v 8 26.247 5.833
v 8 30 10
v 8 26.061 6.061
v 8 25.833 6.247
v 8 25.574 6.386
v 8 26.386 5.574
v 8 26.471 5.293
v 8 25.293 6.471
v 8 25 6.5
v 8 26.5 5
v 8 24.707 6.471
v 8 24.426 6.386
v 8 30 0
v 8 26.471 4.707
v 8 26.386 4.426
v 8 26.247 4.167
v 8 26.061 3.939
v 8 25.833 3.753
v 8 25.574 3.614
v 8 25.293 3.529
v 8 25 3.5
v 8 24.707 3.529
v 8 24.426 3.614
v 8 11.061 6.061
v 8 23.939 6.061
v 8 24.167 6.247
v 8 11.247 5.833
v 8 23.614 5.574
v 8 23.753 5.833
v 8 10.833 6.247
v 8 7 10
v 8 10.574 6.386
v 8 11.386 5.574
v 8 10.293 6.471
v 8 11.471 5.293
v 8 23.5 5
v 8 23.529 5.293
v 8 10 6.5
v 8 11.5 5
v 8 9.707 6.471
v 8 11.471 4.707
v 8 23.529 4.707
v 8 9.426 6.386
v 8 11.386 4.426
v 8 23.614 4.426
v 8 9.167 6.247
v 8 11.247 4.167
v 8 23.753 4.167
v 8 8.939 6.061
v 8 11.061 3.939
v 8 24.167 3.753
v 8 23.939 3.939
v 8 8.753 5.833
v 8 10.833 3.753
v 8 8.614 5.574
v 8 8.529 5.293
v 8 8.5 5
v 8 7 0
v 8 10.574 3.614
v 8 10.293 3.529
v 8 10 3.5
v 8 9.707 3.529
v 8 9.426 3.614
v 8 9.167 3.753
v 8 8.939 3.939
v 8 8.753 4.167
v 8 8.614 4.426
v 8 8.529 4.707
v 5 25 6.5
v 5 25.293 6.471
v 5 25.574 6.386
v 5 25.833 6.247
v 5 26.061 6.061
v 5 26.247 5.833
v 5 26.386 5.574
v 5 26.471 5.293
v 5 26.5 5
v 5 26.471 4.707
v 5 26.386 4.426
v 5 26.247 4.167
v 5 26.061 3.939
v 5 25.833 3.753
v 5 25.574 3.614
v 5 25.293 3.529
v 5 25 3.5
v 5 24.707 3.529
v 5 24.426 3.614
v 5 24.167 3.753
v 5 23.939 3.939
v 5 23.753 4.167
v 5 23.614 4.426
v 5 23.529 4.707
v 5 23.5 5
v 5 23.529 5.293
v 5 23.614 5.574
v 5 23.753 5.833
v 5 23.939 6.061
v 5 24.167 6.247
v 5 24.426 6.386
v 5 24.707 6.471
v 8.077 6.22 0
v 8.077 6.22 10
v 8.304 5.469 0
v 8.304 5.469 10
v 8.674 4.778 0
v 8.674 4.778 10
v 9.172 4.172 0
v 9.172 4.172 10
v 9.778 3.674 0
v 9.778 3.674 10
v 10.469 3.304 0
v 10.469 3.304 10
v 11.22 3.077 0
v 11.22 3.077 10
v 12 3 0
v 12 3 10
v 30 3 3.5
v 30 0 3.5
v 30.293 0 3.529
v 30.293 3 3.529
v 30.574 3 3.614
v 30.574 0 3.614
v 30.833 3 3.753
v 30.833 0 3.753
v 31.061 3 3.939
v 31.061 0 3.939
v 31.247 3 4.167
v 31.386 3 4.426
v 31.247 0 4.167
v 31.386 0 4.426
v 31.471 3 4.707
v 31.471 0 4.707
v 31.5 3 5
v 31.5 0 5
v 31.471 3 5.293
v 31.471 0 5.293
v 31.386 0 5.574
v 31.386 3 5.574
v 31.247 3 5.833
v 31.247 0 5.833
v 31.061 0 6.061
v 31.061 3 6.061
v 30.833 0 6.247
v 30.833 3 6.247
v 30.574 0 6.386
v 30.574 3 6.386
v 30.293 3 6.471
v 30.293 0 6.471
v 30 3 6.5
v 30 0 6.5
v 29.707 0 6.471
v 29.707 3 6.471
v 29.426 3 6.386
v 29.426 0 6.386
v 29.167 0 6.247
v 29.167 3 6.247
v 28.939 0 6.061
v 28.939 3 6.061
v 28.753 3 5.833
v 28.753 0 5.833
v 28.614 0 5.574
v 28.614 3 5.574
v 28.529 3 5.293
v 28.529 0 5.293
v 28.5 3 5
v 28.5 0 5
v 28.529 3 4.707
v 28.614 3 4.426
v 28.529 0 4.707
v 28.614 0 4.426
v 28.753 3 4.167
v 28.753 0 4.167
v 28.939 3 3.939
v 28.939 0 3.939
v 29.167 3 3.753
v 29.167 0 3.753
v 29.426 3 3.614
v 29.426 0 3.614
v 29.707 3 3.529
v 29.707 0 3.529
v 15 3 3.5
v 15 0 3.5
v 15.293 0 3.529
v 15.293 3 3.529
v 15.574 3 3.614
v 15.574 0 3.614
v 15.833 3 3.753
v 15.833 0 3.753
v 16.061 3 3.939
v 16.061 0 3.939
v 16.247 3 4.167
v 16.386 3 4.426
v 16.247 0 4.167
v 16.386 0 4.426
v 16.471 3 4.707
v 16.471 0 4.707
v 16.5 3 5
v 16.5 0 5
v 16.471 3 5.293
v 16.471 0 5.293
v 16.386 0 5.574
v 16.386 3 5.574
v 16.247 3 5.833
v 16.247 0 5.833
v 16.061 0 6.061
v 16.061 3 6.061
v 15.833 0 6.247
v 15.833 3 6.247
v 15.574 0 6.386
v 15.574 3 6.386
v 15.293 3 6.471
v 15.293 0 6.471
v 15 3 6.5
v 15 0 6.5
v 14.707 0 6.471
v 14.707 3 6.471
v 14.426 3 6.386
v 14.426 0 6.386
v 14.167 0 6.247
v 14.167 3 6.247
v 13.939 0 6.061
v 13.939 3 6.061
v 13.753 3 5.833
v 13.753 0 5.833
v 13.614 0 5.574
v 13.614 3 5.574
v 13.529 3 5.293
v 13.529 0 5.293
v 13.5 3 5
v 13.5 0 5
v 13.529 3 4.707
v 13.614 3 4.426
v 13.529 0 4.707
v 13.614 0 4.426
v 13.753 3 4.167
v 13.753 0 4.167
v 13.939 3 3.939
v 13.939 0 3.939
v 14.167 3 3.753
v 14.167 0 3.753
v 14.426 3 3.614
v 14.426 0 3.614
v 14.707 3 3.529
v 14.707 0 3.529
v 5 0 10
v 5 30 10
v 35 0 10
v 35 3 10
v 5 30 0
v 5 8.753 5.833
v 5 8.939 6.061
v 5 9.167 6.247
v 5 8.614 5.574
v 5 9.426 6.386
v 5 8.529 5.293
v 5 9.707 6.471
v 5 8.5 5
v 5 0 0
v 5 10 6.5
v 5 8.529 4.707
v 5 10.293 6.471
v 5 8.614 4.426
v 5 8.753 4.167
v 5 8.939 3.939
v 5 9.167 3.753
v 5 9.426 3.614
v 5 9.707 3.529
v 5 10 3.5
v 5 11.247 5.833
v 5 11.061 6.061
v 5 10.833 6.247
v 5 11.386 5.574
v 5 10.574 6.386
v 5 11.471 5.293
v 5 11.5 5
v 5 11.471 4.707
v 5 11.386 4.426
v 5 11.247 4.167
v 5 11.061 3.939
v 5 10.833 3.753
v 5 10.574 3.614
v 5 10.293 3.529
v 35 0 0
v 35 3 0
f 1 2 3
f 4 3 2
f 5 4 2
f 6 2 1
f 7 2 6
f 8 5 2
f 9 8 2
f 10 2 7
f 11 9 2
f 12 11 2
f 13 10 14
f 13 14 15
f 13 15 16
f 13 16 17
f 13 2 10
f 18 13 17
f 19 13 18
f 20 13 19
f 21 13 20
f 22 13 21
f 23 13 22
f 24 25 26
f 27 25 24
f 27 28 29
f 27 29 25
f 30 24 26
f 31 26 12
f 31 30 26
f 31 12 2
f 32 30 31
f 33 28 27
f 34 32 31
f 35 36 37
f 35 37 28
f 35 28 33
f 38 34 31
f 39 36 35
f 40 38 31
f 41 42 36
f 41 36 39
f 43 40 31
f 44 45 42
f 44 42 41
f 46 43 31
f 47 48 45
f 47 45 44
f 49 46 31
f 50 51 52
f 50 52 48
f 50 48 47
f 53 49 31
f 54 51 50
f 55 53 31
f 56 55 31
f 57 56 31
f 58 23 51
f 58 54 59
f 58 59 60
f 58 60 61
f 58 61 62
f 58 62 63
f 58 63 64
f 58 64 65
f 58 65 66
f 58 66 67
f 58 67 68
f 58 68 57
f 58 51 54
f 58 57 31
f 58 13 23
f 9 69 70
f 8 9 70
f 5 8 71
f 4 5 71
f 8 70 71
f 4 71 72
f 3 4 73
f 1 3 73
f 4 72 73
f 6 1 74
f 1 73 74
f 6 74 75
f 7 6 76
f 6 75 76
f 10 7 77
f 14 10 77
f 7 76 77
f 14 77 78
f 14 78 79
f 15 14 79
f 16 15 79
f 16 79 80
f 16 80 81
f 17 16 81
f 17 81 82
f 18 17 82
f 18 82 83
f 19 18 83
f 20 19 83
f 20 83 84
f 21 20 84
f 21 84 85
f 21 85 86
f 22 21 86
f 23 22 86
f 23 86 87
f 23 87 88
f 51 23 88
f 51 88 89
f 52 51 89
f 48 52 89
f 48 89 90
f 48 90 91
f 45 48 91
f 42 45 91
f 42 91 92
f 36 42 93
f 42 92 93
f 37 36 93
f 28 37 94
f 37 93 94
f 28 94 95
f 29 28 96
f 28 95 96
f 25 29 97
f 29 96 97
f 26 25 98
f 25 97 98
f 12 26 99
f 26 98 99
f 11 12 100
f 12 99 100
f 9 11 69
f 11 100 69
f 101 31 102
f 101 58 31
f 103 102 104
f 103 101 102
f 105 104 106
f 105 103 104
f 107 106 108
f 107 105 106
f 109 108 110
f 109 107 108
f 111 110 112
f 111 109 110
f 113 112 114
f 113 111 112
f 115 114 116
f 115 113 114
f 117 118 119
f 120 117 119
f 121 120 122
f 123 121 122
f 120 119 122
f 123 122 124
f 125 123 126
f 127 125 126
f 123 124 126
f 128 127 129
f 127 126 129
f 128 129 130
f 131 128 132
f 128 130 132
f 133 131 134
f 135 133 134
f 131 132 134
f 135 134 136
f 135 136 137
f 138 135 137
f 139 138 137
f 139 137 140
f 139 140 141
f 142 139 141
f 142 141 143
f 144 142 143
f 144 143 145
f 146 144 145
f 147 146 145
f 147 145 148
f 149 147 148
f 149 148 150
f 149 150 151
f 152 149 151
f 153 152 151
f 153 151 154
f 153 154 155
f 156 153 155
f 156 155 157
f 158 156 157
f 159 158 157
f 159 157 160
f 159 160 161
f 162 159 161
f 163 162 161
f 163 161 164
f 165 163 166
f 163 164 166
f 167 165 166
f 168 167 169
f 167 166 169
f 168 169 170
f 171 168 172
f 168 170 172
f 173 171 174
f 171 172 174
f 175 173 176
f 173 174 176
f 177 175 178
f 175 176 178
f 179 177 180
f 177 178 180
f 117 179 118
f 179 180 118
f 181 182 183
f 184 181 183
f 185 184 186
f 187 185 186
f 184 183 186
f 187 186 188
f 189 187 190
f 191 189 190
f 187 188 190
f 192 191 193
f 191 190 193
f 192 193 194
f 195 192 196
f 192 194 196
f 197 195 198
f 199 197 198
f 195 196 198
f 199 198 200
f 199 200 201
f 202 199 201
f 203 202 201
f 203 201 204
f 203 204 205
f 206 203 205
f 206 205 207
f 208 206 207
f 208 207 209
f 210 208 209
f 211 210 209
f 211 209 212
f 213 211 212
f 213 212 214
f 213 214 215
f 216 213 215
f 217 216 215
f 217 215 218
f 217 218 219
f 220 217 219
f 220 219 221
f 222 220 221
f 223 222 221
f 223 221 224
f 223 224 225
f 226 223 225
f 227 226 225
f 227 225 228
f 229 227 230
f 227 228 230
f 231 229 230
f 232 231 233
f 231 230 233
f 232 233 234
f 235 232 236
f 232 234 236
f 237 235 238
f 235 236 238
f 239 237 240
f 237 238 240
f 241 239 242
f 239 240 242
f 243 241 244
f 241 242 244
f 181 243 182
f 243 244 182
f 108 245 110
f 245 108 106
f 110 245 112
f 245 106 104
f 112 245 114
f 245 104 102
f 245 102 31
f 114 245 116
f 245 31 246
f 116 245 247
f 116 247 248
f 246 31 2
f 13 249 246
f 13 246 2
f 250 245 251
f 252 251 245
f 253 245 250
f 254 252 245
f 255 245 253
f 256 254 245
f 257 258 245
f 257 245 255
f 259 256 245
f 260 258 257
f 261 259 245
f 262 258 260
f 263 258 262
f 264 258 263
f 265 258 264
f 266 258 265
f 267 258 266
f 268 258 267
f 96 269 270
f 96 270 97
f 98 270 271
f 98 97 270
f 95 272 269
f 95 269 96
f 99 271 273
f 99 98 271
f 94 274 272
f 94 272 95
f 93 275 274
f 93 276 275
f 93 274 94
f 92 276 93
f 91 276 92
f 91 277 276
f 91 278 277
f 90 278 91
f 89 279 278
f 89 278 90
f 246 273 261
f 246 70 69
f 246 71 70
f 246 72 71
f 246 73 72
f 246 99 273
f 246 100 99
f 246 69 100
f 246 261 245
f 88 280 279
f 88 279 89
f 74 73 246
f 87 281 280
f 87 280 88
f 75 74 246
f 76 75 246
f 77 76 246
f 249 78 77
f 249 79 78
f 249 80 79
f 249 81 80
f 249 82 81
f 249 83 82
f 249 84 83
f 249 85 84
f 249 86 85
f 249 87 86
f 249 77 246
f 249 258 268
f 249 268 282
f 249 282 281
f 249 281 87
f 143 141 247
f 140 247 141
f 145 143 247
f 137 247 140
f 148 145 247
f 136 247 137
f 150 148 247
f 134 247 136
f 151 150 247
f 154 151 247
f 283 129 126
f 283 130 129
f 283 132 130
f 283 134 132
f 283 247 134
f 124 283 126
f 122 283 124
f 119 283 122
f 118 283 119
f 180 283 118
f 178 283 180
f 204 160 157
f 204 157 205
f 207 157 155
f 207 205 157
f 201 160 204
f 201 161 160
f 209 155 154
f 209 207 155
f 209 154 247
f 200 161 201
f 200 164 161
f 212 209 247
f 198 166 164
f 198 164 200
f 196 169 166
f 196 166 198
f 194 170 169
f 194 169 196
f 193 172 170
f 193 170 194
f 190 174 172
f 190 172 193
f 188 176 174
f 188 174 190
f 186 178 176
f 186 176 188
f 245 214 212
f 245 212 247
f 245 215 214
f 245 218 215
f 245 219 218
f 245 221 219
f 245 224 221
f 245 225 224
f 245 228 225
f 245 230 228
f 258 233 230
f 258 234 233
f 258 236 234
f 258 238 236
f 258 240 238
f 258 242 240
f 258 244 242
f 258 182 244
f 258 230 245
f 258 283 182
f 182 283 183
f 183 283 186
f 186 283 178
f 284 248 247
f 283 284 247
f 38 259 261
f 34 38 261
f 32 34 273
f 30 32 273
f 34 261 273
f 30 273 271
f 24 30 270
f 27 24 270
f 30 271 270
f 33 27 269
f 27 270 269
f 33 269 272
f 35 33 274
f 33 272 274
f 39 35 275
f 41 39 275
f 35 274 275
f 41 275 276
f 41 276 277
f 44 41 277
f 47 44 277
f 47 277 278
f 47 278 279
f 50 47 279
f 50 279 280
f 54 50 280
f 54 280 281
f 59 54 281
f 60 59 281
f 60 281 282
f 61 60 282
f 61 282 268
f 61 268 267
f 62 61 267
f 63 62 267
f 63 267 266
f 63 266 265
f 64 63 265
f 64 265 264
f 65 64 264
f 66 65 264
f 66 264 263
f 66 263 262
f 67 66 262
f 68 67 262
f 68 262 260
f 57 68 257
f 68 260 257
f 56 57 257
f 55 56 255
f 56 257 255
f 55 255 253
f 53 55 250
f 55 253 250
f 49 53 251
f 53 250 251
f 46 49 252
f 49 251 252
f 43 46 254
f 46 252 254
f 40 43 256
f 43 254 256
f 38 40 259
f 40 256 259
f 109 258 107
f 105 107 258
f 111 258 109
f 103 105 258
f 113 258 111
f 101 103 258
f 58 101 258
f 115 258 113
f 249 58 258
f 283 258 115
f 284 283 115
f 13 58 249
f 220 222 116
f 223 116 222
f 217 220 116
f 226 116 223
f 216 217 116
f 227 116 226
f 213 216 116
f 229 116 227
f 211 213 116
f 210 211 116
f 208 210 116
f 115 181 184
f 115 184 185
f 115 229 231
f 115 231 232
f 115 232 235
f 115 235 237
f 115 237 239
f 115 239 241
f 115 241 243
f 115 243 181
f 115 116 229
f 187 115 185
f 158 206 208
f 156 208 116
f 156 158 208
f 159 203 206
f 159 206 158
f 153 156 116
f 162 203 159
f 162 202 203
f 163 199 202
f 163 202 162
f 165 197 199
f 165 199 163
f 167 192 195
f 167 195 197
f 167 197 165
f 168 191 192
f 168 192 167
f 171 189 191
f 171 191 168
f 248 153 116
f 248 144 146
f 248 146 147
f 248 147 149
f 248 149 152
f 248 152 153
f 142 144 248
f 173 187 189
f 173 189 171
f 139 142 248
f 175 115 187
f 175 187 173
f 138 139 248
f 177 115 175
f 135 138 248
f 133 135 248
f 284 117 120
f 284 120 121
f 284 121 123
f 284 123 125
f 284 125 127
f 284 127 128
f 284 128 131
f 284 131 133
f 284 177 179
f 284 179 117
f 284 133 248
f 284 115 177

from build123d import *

# Parameters (mm, degrees)
F1_DEPTH   = 5
F4_D       = 3
F4_ON_F3_D = 3
F5_ANGLE   = 90


with BuildPart() as f1:
    # F0 (on Right) → F1 (new body, symmetric)
    with BuildSketch(Plane.YZ):
        with BuildLine():
            Line((3, 30), (0, 30))
            Line((0, 30), (0, 0))
            Line((0, 0), (30, 0))
            Line((30, 0), (30, 3))
            Line((30, 3), (7, 3))
            ThreePointArc((7, 3), (4.1715728753, 4.1715728753), (3, 7))
            Line((3, 7), (3, 30))
        make_face()
    extrude(amount=F1_DEPTH, both=True)

    # F4 (through all)
    with Locations(Plane.XY.offset(3)):
        with Locations((0, 25), (0, 10)):
            Hole(F4_D / 2)

    # F4 on F3 (through all)
    with Locations(Plane(origin=(0, 3, 0), x_dir=(-1, 0, 0), z_dir=(0, 1, 0))):
        with Locations((0, 25), (0, 10)):
            Hole(F4_ON_F3_D / 2)


with BuildPart() as f1_1:
    # F5: moved
    add(f1.part.rotate(Axis((5, 15, 0), (0, 1, 0)), F5_ANGLE))


solid = f1_1.part
